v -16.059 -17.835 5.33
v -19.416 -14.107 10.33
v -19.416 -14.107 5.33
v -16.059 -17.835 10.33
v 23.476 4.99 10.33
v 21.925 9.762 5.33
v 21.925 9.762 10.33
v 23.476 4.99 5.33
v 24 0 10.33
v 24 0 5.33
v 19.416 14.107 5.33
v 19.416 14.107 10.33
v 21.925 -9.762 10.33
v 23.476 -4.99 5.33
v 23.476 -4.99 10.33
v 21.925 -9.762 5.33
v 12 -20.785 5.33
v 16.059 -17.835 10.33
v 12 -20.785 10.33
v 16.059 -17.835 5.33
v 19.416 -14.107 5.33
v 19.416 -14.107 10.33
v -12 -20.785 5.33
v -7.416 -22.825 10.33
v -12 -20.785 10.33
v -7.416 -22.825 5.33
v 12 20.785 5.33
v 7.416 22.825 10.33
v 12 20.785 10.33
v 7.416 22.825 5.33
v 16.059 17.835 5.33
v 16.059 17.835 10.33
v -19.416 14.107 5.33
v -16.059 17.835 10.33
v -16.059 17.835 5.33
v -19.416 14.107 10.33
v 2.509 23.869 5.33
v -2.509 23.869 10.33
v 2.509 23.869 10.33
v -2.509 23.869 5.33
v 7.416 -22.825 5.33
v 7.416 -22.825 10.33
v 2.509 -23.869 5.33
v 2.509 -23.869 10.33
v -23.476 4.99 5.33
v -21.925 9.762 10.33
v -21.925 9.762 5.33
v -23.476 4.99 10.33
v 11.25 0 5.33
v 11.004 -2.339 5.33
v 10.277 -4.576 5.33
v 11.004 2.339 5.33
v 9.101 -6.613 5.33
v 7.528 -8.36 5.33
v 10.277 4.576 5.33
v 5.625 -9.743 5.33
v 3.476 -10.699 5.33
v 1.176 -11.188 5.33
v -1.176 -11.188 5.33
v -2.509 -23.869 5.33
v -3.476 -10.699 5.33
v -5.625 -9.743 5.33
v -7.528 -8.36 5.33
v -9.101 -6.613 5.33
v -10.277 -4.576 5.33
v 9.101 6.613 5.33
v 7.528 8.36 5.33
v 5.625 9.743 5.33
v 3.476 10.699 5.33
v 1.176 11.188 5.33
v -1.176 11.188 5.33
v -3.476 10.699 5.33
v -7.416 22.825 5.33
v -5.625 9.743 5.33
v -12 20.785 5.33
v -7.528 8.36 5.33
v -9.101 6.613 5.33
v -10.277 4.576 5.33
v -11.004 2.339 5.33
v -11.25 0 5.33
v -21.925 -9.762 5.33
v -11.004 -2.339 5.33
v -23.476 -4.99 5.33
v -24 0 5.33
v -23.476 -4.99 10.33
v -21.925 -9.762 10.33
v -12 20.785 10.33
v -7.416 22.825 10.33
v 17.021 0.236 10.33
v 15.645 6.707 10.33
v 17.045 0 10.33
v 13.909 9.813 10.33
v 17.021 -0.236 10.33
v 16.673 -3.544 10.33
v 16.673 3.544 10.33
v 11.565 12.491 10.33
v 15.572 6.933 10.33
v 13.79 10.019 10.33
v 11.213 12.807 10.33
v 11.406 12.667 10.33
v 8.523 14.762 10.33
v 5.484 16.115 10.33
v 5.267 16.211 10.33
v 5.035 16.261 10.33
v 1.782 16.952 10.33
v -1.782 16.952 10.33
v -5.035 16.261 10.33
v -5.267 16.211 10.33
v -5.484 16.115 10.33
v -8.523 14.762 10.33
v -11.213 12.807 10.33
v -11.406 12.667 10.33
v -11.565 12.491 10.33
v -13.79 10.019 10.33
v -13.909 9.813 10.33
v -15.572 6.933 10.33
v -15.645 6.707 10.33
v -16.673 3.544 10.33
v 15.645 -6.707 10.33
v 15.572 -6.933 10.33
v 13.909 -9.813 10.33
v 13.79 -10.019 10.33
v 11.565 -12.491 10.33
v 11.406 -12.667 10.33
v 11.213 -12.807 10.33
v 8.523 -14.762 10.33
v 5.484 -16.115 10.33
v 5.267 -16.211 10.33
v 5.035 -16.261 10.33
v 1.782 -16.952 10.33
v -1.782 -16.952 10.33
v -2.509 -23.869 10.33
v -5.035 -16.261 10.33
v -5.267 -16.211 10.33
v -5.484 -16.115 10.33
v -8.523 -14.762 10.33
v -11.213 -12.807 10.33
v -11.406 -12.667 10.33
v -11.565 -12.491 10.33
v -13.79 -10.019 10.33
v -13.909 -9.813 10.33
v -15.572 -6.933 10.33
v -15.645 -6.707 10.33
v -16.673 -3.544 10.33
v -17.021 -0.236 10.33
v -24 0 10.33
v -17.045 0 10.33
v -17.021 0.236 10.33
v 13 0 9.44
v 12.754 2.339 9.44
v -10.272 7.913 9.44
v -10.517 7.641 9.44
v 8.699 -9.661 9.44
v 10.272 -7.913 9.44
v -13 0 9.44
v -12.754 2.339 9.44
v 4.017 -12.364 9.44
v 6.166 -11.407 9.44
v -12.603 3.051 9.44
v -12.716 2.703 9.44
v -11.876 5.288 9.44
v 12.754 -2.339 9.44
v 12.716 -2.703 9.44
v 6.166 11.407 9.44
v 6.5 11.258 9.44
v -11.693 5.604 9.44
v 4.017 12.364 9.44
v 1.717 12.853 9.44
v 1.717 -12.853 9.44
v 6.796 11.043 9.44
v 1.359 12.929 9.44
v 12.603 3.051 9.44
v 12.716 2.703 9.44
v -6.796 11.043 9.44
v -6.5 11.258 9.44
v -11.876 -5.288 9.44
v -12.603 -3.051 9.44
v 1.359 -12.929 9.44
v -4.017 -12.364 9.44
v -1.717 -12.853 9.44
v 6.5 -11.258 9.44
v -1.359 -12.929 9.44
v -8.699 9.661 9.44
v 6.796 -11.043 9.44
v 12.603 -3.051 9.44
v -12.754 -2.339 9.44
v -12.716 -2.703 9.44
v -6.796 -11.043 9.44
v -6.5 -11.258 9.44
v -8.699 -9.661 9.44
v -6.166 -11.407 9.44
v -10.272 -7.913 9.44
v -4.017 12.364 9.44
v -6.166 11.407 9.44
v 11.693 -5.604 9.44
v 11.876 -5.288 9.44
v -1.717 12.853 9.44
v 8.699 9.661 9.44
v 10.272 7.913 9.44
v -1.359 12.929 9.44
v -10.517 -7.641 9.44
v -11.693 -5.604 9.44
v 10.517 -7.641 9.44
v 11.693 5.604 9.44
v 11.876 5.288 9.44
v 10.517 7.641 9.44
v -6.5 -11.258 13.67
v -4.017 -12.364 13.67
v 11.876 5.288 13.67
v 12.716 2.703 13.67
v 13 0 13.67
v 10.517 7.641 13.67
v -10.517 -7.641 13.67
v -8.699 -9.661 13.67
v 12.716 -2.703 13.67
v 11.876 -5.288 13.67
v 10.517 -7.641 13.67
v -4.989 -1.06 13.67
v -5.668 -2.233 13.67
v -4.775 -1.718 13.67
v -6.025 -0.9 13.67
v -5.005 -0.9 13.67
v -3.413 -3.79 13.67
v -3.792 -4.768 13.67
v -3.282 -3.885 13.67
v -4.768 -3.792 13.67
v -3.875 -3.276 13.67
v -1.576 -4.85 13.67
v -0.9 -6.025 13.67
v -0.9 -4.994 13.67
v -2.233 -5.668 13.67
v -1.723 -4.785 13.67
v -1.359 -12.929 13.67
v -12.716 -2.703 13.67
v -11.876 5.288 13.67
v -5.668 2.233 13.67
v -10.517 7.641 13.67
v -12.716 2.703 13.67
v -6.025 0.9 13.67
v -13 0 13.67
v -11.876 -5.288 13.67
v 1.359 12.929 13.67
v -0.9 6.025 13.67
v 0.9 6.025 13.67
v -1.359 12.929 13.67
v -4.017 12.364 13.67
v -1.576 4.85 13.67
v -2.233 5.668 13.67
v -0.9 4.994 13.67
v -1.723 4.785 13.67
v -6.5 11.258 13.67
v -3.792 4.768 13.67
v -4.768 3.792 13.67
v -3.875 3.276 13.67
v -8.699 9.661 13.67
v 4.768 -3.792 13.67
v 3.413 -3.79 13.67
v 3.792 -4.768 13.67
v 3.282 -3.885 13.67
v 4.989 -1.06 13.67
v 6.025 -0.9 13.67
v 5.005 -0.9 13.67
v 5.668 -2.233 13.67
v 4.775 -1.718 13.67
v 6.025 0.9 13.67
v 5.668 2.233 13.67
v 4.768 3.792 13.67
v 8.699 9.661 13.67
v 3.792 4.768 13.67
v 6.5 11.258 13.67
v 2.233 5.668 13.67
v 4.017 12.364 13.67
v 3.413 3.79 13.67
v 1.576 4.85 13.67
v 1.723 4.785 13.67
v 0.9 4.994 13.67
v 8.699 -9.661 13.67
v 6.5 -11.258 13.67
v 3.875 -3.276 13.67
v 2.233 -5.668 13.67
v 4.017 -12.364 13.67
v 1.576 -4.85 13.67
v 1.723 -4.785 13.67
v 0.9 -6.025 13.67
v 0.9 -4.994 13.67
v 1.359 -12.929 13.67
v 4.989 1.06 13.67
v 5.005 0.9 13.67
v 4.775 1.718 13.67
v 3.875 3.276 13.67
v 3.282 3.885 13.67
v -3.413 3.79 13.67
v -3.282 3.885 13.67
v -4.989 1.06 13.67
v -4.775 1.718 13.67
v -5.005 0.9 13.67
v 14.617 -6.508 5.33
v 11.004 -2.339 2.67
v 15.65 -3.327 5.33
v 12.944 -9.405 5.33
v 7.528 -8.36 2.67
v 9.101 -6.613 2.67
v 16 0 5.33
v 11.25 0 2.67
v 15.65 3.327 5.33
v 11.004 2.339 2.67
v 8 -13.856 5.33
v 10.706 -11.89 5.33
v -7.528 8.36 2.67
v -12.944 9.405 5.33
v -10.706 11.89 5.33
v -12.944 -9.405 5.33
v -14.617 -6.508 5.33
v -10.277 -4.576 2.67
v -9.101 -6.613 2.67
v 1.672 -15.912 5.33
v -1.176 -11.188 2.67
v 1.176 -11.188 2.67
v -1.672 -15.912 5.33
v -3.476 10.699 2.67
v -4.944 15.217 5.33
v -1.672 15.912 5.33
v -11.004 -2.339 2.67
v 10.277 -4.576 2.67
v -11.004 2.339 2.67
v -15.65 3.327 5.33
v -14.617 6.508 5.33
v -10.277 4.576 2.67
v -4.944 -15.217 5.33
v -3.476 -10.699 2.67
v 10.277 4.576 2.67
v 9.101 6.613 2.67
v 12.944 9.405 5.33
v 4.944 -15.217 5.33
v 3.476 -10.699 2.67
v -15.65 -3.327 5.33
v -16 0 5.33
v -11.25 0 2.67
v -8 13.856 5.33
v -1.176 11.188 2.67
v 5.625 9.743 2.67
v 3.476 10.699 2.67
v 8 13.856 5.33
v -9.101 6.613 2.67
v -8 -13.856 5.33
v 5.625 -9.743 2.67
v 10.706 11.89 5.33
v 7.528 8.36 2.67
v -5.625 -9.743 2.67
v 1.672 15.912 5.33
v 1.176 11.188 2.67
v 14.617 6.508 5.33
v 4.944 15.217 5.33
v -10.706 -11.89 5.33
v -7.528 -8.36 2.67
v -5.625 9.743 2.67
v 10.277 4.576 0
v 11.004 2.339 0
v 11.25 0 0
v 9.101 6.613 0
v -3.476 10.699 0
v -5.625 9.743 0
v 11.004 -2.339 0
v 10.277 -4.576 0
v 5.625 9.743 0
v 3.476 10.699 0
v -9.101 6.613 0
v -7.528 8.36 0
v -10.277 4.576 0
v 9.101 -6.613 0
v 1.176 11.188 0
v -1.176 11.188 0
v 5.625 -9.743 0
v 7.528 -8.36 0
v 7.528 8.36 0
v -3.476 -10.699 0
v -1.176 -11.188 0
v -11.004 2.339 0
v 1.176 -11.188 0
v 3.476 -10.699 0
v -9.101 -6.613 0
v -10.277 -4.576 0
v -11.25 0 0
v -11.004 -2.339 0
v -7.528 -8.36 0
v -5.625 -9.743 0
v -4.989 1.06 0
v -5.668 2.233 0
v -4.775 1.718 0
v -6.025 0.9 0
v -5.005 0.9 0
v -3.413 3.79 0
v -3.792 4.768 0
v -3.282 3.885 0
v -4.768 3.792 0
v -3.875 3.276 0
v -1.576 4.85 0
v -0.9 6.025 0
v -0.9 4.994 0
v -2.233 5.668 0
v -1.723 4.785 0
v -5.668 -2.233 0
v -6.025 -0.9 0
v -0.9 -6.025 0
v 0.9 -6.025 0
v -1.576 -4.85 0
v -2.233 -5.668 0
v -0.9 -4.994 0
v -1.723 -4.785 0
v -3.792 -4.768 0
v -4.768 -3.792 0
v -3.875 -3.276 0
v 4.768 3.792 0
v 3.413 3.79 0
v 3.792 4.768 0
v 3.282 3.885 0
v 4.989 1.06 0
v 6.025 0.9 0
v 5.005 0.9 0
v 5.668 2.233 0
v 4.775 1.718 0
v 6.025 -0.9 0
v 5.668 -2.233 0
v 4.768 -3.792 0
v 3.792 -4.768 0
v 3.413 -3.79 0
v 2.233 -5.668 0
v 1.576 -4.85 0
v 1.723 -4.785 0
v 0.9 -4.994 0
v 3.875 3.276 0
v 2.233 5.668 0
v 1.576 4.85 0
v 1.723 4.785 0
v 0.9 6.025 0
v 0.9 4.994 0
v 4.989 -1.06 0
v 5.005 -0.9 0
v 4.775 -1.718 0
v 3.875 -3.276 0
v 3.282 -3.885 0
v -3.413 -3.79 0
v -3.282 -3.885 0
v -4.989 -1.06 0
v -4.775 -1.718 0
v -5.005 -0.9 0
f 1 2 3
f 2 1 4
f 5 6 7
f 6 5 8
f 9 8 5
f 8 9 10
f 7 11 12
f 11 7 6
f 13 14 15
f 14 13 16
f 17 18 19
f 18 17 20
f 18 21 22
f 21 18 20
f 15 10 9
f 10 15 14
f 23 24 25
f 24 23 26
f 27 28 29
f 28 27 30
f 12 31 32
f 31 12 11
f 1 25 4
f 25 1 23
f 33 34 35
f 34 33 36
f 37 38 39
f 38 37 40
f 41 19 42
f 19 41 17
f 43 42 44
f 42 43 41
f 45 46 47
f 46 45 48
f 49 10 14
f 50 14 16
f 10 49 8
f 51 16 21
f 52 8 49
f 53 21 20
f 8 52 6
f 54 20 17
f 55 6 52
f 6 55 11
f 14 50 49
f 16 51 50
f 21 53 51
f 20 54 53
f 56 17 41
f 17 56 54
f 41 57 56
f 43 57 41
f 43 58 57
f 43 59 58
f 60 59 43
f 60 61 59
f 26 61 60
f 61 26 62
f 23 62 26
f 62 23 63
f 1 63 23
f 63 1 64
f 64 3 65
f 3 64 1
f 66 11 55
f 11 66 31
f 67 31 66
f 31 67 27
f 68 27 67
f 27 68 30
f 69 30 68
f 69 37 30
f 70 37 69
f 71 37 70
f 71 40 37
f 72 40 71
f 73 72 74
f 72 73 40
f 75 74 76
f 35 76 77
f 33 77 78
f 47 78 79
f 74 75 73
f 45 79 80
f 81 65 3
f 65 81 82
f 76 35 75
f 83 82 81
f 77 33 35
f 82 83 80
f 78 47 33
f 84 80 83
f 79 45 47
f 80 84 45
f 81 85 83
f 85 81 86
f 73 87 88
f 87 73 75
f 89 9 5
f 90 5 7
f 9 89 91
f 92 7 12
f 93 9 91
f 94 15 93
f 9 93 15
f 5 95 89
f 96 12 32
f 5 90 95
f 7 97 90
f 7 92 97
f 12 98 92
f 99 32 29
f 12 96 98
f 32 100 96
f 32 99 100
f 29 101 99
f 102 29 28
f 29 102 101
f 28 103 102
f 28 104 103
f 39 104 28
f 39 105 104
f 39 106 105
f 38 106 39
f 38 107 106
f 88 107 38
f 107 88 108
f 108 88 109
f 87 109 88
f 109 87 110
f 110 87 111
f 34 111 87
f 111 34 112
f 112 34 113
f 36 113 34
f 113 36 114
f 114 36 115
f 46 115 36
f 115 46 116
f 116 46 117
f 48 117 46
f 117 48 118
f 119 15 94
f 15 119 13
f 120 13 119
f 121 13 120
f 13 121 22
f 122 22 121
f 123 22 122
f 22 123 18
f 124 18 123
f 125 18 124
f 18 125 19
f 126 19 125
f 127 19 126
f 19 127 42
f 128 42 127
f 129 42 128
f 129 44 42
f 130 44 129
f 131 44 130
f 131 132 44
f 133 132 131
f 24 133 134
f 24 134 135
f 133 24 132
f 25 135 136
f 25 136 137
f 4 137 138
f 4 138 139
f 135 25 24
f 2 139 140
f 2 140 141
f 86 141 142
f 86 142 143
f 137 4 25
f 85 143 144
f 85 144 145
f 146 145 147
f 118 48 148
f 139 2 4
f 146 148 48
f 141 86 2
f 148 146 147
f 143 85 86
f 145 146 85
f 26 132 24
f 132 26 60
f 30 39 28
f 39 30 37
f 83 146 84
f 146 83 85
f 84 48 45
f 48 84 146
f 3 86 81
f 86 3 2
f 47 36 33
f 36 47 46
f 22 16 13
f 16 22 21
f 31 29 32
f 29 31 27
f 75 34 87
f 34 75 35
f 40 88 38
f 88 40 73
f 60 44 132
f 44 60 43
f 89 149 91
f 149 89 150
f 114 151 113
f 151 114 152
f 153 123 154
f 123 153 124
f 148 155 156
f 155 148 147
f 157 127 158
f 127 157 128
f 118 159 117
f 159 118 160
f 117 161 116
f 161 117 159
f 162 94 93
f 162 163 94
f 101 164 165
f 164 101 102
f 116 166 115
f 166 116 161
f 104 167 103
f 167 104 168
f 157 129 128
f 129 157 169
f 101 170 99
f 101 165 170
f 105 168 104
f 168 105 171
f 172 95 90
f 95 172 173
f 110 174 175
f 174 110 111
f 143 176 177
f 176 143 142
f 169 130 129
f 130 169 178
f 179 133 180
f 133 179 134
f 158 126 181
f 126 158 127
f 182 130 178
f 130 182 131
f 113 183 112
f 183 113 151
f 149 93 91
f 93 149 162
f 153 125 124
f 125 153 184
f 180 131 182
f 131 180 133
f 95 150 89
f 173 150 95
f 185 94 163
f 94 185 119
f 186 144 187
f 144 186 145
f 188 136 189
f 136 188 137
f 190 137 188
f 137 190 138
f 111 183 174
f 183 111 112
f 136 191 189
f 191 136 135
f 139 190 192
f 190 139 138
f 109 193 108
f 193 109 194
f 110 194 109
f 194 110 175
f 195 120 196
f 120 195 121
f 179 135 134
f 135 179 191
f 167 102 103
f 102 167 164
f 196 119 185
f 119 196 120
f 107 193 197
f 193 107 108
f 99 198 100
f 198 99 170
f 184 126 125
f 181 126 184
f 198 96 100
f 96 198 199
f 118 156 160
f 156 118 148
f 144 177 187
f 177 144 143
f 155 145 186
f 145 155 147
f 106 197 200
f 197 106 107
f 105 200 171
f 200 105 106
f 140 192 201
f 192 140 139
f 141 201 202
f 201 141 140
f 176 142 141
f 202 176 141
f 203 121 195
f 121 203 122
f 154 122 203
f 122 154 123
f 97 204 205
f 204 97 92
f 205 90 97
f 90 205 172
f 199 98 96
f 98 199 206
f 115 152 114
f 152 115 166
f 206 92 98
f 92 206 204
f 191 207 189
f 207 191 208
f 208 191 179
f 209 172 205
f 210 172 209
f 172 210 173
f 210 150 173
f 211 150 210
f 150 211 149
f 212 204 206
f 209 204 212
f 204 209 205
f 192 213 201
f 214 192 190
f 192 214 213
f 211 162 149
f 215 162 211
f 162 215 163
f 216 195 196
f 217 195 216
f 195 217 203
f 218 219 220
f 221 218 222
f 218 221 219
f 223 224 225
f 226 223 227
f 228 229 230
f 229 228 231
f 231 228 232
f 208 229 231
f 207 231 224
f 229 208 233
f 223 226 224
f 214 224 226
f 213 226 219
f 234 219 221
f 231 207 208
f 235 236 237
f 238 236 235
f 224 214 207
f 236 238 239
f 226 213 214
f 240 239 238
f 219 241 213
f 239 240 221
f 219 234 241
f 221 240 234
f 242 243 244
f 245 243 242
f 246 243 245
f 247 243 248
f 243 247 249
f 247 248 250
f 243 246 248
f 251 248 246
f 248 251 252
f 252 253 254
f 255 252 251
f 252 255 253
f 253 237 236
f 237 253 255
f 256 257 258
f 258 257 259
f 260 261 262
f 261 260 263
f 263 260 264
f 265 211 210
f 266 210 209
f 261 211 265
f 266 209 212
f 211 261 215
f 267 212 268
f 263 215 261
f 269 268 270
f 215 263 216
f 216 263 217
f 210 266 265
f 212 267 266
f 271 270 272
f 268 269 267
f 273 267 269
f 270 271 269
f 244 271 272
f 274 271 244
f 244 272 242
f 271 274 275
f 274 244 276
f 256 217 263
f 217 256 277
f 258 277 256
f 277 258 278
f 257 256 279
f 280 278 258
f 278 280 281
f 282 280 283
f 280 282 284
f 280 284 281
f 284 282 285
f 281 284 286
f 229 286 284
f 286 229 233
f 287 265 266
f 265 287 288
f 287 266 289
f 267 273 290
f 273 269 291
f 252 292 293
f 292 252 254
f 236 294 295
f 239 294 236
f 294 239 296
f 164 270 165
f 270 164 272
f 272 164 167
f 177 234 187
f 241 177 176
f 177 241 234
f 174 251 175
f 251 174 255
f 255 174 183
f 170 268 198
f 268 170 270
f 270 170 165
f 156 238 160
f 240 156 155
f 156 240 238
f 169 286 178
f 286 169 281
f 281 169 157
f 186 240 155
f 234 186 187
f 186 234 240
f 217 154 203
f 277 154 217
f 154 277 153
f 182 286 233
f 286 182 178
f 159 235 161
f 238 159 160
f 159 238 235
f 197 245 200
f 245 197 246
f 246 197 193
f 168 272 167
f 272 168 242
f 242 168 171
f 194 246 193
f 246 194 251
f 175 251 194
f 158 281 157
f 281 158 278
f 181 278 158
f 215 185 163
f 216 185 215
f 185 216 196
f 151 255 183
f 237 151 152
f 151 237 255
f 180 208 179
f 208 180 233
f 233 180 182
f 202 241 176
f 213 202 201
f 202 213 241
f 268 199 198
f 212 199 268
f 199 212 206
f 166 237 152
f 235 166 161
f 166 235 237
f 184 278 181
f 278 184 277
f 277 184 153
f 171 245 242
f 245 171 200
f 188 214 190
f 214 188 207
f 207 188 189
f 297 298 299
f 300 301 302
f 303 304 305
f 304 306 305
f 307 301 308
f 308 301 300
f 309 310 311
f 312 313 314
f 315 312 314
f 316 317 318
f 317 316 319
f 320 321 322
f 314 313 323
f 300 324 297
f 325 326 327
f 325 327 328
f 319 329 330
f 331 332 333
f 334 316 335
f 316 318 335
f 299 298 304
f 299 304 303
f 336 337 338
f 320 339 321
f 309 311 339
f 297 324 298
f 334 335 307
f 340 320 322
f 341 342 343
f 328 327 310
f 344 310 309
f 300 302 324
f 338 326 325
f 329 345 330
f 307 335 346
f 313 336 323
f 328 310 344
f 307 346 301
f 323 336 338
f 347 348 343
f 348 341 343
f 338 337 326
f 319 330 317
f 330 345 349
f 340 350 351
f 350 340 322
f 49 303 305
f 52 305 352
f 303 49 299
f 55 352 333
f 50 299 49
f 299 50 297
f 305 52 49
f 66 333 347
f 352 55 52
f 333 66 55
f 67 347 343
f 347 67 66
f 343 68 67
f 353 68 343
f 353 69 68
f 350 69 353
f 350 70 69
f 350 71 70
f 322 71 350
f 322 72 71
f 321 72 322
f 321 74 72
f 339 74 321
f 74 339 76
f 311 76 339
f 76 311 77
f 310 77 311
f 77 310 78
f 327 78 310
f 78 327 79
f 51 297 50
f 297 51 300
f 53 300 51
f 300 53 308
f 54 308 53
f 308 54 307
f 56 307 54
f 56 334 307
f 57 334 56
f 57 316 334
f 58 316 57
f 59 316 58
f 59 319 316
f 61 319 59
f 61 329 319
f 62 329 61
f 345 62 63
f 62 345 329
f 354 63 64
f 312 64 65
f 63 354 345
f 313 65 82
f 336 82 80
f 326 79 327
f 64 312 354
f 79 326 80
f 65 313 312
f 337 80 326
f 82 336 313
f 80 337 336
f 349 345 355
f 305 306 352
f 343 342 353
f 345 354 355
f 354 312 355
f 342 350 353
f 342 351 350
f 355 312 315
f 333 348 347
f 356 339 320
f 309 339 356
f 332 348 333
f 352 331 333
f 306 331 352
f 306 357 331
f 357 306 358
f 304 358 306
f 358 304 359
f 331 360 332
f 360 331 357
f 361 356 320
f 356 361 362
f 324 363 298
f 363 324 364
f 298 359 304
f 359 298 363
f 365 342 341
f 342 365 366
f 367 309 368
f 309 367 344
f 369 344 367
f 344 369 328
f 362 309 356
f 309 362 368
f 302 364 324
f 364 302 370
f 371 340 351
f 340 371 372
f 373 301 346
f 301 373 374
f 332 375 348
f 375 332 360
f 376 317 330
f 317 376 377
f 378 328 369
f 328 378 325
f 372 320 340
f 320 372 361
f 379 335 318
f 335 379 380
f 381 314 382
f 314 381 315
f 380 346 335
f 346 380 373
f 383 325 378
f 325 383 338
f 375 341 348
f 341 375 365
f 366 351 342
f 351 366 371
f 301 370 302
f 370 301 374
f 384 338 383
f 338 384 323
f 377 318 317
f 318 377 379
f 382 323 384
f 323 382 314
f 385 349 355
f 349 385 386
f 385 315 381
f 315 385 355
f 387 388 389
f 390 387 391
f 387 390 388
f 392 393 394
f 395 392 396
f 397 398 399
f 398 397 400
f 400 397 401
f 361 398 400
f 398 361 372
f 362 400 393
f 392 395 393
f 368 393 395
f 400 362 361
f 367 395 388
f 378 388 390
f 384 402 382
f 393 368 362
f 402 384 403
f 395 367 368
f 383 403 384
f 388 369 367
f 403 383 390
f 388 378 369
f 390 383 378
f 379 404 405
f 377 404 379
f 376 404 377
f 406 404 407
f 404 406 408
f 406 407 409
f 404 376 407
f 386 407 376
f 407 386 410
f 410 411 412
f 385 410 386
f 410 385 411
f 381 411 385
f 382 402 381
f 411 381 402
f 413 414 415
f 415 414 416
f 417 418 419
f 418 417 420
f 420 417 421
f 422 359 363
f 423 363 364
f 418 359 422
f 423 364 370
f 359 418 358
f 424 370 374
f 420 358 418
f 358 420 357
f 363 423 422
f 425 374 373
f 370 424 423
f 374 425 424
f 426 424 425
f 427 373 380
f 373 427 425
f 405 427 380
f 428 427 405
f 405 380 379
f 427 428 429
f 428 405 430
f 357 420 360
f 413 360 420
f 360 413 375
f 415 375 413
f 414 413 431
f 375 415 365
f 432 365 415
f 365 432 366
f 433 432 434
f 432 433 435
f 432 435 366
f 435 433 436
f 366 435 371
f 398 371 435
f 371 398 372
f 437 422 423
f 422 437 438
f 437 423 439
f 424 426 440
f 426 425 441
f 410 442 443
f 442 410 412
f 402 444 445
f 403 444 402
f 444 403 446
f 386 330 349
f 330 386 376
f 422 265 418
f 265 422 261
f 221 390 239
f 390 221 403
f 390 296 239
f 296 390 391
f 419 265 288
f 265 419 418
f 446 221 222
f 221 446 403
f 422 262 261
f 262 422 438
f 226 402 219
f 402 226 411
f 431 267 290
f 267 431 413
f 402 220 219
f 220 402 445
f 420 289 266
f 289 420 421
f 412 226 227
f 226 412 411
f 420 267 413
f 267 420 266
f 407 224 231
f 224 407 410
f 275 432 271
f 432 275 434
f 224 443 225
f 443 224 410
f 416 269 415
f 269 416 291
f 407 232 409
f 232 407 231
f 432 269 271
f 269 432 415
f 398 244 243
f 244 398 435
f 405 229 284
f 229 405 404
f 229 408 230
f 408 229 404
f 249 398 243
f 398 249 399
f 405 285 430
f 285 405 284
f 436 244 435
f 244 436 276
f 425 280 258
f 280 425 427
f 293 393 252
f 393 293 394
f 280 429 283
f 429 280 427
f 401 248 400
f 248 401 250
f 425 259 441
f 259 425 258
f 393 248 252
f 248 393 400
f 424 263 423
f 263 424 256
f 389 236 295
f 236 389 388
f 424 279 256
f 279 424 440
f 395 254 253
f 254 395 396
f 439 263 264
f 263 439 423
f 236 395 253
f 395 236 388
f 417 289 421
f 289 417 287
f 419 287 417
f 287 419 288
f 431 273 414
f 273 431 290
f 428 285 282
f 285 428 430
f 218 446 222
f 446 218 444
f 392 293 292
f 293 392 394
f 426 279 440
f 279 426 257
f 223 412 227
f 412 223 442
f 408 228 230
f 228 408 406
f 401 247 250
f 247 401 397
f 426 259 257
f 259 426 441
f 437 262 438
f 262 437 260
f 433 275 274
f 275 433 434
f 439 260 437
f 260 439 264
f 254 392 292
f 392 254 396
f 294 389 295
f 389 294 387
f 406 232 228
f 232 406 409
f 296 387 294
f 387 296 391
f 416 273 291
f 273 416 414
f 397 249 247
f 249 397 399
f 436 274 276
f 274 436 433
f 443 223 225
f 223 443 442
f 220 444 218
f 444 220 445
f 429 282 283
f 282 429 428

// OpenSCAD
d1=22.5;
d2=48;
d3=26;
h=13;
h1=2.67;

di1=10.2;
di2=12.05;

$fs=.2;

difference() {
    union() {
        cylinder(d=d1,h=h);
        translate([0,0,h1]) {
            translate([0,0,h-h1-4]) cylinder(d=d3,h=h1+2);
            cylinder(d1=d1,d2=32,h=h-2*h1-5);
            translate([0,0,h-2*h1-5]) {
                difference() {
                    cylinder(d=d2,h=5);
                    translate([0,0,4]) cylinder(d1=25,d2=35,h=1.1);
                }
            }
        }
    }
    translate([0,0,-1]) {
        cylinder(d=di1, h=h+2);
        for (a = [0:30:360]) {
            rotate([0,0,a])  //translate([di1/2,0,0]) cylinder(d=di2-di1,h=h+2);
                cube([di2,1.8,3*h+2], center=true);
        }
    }
}
